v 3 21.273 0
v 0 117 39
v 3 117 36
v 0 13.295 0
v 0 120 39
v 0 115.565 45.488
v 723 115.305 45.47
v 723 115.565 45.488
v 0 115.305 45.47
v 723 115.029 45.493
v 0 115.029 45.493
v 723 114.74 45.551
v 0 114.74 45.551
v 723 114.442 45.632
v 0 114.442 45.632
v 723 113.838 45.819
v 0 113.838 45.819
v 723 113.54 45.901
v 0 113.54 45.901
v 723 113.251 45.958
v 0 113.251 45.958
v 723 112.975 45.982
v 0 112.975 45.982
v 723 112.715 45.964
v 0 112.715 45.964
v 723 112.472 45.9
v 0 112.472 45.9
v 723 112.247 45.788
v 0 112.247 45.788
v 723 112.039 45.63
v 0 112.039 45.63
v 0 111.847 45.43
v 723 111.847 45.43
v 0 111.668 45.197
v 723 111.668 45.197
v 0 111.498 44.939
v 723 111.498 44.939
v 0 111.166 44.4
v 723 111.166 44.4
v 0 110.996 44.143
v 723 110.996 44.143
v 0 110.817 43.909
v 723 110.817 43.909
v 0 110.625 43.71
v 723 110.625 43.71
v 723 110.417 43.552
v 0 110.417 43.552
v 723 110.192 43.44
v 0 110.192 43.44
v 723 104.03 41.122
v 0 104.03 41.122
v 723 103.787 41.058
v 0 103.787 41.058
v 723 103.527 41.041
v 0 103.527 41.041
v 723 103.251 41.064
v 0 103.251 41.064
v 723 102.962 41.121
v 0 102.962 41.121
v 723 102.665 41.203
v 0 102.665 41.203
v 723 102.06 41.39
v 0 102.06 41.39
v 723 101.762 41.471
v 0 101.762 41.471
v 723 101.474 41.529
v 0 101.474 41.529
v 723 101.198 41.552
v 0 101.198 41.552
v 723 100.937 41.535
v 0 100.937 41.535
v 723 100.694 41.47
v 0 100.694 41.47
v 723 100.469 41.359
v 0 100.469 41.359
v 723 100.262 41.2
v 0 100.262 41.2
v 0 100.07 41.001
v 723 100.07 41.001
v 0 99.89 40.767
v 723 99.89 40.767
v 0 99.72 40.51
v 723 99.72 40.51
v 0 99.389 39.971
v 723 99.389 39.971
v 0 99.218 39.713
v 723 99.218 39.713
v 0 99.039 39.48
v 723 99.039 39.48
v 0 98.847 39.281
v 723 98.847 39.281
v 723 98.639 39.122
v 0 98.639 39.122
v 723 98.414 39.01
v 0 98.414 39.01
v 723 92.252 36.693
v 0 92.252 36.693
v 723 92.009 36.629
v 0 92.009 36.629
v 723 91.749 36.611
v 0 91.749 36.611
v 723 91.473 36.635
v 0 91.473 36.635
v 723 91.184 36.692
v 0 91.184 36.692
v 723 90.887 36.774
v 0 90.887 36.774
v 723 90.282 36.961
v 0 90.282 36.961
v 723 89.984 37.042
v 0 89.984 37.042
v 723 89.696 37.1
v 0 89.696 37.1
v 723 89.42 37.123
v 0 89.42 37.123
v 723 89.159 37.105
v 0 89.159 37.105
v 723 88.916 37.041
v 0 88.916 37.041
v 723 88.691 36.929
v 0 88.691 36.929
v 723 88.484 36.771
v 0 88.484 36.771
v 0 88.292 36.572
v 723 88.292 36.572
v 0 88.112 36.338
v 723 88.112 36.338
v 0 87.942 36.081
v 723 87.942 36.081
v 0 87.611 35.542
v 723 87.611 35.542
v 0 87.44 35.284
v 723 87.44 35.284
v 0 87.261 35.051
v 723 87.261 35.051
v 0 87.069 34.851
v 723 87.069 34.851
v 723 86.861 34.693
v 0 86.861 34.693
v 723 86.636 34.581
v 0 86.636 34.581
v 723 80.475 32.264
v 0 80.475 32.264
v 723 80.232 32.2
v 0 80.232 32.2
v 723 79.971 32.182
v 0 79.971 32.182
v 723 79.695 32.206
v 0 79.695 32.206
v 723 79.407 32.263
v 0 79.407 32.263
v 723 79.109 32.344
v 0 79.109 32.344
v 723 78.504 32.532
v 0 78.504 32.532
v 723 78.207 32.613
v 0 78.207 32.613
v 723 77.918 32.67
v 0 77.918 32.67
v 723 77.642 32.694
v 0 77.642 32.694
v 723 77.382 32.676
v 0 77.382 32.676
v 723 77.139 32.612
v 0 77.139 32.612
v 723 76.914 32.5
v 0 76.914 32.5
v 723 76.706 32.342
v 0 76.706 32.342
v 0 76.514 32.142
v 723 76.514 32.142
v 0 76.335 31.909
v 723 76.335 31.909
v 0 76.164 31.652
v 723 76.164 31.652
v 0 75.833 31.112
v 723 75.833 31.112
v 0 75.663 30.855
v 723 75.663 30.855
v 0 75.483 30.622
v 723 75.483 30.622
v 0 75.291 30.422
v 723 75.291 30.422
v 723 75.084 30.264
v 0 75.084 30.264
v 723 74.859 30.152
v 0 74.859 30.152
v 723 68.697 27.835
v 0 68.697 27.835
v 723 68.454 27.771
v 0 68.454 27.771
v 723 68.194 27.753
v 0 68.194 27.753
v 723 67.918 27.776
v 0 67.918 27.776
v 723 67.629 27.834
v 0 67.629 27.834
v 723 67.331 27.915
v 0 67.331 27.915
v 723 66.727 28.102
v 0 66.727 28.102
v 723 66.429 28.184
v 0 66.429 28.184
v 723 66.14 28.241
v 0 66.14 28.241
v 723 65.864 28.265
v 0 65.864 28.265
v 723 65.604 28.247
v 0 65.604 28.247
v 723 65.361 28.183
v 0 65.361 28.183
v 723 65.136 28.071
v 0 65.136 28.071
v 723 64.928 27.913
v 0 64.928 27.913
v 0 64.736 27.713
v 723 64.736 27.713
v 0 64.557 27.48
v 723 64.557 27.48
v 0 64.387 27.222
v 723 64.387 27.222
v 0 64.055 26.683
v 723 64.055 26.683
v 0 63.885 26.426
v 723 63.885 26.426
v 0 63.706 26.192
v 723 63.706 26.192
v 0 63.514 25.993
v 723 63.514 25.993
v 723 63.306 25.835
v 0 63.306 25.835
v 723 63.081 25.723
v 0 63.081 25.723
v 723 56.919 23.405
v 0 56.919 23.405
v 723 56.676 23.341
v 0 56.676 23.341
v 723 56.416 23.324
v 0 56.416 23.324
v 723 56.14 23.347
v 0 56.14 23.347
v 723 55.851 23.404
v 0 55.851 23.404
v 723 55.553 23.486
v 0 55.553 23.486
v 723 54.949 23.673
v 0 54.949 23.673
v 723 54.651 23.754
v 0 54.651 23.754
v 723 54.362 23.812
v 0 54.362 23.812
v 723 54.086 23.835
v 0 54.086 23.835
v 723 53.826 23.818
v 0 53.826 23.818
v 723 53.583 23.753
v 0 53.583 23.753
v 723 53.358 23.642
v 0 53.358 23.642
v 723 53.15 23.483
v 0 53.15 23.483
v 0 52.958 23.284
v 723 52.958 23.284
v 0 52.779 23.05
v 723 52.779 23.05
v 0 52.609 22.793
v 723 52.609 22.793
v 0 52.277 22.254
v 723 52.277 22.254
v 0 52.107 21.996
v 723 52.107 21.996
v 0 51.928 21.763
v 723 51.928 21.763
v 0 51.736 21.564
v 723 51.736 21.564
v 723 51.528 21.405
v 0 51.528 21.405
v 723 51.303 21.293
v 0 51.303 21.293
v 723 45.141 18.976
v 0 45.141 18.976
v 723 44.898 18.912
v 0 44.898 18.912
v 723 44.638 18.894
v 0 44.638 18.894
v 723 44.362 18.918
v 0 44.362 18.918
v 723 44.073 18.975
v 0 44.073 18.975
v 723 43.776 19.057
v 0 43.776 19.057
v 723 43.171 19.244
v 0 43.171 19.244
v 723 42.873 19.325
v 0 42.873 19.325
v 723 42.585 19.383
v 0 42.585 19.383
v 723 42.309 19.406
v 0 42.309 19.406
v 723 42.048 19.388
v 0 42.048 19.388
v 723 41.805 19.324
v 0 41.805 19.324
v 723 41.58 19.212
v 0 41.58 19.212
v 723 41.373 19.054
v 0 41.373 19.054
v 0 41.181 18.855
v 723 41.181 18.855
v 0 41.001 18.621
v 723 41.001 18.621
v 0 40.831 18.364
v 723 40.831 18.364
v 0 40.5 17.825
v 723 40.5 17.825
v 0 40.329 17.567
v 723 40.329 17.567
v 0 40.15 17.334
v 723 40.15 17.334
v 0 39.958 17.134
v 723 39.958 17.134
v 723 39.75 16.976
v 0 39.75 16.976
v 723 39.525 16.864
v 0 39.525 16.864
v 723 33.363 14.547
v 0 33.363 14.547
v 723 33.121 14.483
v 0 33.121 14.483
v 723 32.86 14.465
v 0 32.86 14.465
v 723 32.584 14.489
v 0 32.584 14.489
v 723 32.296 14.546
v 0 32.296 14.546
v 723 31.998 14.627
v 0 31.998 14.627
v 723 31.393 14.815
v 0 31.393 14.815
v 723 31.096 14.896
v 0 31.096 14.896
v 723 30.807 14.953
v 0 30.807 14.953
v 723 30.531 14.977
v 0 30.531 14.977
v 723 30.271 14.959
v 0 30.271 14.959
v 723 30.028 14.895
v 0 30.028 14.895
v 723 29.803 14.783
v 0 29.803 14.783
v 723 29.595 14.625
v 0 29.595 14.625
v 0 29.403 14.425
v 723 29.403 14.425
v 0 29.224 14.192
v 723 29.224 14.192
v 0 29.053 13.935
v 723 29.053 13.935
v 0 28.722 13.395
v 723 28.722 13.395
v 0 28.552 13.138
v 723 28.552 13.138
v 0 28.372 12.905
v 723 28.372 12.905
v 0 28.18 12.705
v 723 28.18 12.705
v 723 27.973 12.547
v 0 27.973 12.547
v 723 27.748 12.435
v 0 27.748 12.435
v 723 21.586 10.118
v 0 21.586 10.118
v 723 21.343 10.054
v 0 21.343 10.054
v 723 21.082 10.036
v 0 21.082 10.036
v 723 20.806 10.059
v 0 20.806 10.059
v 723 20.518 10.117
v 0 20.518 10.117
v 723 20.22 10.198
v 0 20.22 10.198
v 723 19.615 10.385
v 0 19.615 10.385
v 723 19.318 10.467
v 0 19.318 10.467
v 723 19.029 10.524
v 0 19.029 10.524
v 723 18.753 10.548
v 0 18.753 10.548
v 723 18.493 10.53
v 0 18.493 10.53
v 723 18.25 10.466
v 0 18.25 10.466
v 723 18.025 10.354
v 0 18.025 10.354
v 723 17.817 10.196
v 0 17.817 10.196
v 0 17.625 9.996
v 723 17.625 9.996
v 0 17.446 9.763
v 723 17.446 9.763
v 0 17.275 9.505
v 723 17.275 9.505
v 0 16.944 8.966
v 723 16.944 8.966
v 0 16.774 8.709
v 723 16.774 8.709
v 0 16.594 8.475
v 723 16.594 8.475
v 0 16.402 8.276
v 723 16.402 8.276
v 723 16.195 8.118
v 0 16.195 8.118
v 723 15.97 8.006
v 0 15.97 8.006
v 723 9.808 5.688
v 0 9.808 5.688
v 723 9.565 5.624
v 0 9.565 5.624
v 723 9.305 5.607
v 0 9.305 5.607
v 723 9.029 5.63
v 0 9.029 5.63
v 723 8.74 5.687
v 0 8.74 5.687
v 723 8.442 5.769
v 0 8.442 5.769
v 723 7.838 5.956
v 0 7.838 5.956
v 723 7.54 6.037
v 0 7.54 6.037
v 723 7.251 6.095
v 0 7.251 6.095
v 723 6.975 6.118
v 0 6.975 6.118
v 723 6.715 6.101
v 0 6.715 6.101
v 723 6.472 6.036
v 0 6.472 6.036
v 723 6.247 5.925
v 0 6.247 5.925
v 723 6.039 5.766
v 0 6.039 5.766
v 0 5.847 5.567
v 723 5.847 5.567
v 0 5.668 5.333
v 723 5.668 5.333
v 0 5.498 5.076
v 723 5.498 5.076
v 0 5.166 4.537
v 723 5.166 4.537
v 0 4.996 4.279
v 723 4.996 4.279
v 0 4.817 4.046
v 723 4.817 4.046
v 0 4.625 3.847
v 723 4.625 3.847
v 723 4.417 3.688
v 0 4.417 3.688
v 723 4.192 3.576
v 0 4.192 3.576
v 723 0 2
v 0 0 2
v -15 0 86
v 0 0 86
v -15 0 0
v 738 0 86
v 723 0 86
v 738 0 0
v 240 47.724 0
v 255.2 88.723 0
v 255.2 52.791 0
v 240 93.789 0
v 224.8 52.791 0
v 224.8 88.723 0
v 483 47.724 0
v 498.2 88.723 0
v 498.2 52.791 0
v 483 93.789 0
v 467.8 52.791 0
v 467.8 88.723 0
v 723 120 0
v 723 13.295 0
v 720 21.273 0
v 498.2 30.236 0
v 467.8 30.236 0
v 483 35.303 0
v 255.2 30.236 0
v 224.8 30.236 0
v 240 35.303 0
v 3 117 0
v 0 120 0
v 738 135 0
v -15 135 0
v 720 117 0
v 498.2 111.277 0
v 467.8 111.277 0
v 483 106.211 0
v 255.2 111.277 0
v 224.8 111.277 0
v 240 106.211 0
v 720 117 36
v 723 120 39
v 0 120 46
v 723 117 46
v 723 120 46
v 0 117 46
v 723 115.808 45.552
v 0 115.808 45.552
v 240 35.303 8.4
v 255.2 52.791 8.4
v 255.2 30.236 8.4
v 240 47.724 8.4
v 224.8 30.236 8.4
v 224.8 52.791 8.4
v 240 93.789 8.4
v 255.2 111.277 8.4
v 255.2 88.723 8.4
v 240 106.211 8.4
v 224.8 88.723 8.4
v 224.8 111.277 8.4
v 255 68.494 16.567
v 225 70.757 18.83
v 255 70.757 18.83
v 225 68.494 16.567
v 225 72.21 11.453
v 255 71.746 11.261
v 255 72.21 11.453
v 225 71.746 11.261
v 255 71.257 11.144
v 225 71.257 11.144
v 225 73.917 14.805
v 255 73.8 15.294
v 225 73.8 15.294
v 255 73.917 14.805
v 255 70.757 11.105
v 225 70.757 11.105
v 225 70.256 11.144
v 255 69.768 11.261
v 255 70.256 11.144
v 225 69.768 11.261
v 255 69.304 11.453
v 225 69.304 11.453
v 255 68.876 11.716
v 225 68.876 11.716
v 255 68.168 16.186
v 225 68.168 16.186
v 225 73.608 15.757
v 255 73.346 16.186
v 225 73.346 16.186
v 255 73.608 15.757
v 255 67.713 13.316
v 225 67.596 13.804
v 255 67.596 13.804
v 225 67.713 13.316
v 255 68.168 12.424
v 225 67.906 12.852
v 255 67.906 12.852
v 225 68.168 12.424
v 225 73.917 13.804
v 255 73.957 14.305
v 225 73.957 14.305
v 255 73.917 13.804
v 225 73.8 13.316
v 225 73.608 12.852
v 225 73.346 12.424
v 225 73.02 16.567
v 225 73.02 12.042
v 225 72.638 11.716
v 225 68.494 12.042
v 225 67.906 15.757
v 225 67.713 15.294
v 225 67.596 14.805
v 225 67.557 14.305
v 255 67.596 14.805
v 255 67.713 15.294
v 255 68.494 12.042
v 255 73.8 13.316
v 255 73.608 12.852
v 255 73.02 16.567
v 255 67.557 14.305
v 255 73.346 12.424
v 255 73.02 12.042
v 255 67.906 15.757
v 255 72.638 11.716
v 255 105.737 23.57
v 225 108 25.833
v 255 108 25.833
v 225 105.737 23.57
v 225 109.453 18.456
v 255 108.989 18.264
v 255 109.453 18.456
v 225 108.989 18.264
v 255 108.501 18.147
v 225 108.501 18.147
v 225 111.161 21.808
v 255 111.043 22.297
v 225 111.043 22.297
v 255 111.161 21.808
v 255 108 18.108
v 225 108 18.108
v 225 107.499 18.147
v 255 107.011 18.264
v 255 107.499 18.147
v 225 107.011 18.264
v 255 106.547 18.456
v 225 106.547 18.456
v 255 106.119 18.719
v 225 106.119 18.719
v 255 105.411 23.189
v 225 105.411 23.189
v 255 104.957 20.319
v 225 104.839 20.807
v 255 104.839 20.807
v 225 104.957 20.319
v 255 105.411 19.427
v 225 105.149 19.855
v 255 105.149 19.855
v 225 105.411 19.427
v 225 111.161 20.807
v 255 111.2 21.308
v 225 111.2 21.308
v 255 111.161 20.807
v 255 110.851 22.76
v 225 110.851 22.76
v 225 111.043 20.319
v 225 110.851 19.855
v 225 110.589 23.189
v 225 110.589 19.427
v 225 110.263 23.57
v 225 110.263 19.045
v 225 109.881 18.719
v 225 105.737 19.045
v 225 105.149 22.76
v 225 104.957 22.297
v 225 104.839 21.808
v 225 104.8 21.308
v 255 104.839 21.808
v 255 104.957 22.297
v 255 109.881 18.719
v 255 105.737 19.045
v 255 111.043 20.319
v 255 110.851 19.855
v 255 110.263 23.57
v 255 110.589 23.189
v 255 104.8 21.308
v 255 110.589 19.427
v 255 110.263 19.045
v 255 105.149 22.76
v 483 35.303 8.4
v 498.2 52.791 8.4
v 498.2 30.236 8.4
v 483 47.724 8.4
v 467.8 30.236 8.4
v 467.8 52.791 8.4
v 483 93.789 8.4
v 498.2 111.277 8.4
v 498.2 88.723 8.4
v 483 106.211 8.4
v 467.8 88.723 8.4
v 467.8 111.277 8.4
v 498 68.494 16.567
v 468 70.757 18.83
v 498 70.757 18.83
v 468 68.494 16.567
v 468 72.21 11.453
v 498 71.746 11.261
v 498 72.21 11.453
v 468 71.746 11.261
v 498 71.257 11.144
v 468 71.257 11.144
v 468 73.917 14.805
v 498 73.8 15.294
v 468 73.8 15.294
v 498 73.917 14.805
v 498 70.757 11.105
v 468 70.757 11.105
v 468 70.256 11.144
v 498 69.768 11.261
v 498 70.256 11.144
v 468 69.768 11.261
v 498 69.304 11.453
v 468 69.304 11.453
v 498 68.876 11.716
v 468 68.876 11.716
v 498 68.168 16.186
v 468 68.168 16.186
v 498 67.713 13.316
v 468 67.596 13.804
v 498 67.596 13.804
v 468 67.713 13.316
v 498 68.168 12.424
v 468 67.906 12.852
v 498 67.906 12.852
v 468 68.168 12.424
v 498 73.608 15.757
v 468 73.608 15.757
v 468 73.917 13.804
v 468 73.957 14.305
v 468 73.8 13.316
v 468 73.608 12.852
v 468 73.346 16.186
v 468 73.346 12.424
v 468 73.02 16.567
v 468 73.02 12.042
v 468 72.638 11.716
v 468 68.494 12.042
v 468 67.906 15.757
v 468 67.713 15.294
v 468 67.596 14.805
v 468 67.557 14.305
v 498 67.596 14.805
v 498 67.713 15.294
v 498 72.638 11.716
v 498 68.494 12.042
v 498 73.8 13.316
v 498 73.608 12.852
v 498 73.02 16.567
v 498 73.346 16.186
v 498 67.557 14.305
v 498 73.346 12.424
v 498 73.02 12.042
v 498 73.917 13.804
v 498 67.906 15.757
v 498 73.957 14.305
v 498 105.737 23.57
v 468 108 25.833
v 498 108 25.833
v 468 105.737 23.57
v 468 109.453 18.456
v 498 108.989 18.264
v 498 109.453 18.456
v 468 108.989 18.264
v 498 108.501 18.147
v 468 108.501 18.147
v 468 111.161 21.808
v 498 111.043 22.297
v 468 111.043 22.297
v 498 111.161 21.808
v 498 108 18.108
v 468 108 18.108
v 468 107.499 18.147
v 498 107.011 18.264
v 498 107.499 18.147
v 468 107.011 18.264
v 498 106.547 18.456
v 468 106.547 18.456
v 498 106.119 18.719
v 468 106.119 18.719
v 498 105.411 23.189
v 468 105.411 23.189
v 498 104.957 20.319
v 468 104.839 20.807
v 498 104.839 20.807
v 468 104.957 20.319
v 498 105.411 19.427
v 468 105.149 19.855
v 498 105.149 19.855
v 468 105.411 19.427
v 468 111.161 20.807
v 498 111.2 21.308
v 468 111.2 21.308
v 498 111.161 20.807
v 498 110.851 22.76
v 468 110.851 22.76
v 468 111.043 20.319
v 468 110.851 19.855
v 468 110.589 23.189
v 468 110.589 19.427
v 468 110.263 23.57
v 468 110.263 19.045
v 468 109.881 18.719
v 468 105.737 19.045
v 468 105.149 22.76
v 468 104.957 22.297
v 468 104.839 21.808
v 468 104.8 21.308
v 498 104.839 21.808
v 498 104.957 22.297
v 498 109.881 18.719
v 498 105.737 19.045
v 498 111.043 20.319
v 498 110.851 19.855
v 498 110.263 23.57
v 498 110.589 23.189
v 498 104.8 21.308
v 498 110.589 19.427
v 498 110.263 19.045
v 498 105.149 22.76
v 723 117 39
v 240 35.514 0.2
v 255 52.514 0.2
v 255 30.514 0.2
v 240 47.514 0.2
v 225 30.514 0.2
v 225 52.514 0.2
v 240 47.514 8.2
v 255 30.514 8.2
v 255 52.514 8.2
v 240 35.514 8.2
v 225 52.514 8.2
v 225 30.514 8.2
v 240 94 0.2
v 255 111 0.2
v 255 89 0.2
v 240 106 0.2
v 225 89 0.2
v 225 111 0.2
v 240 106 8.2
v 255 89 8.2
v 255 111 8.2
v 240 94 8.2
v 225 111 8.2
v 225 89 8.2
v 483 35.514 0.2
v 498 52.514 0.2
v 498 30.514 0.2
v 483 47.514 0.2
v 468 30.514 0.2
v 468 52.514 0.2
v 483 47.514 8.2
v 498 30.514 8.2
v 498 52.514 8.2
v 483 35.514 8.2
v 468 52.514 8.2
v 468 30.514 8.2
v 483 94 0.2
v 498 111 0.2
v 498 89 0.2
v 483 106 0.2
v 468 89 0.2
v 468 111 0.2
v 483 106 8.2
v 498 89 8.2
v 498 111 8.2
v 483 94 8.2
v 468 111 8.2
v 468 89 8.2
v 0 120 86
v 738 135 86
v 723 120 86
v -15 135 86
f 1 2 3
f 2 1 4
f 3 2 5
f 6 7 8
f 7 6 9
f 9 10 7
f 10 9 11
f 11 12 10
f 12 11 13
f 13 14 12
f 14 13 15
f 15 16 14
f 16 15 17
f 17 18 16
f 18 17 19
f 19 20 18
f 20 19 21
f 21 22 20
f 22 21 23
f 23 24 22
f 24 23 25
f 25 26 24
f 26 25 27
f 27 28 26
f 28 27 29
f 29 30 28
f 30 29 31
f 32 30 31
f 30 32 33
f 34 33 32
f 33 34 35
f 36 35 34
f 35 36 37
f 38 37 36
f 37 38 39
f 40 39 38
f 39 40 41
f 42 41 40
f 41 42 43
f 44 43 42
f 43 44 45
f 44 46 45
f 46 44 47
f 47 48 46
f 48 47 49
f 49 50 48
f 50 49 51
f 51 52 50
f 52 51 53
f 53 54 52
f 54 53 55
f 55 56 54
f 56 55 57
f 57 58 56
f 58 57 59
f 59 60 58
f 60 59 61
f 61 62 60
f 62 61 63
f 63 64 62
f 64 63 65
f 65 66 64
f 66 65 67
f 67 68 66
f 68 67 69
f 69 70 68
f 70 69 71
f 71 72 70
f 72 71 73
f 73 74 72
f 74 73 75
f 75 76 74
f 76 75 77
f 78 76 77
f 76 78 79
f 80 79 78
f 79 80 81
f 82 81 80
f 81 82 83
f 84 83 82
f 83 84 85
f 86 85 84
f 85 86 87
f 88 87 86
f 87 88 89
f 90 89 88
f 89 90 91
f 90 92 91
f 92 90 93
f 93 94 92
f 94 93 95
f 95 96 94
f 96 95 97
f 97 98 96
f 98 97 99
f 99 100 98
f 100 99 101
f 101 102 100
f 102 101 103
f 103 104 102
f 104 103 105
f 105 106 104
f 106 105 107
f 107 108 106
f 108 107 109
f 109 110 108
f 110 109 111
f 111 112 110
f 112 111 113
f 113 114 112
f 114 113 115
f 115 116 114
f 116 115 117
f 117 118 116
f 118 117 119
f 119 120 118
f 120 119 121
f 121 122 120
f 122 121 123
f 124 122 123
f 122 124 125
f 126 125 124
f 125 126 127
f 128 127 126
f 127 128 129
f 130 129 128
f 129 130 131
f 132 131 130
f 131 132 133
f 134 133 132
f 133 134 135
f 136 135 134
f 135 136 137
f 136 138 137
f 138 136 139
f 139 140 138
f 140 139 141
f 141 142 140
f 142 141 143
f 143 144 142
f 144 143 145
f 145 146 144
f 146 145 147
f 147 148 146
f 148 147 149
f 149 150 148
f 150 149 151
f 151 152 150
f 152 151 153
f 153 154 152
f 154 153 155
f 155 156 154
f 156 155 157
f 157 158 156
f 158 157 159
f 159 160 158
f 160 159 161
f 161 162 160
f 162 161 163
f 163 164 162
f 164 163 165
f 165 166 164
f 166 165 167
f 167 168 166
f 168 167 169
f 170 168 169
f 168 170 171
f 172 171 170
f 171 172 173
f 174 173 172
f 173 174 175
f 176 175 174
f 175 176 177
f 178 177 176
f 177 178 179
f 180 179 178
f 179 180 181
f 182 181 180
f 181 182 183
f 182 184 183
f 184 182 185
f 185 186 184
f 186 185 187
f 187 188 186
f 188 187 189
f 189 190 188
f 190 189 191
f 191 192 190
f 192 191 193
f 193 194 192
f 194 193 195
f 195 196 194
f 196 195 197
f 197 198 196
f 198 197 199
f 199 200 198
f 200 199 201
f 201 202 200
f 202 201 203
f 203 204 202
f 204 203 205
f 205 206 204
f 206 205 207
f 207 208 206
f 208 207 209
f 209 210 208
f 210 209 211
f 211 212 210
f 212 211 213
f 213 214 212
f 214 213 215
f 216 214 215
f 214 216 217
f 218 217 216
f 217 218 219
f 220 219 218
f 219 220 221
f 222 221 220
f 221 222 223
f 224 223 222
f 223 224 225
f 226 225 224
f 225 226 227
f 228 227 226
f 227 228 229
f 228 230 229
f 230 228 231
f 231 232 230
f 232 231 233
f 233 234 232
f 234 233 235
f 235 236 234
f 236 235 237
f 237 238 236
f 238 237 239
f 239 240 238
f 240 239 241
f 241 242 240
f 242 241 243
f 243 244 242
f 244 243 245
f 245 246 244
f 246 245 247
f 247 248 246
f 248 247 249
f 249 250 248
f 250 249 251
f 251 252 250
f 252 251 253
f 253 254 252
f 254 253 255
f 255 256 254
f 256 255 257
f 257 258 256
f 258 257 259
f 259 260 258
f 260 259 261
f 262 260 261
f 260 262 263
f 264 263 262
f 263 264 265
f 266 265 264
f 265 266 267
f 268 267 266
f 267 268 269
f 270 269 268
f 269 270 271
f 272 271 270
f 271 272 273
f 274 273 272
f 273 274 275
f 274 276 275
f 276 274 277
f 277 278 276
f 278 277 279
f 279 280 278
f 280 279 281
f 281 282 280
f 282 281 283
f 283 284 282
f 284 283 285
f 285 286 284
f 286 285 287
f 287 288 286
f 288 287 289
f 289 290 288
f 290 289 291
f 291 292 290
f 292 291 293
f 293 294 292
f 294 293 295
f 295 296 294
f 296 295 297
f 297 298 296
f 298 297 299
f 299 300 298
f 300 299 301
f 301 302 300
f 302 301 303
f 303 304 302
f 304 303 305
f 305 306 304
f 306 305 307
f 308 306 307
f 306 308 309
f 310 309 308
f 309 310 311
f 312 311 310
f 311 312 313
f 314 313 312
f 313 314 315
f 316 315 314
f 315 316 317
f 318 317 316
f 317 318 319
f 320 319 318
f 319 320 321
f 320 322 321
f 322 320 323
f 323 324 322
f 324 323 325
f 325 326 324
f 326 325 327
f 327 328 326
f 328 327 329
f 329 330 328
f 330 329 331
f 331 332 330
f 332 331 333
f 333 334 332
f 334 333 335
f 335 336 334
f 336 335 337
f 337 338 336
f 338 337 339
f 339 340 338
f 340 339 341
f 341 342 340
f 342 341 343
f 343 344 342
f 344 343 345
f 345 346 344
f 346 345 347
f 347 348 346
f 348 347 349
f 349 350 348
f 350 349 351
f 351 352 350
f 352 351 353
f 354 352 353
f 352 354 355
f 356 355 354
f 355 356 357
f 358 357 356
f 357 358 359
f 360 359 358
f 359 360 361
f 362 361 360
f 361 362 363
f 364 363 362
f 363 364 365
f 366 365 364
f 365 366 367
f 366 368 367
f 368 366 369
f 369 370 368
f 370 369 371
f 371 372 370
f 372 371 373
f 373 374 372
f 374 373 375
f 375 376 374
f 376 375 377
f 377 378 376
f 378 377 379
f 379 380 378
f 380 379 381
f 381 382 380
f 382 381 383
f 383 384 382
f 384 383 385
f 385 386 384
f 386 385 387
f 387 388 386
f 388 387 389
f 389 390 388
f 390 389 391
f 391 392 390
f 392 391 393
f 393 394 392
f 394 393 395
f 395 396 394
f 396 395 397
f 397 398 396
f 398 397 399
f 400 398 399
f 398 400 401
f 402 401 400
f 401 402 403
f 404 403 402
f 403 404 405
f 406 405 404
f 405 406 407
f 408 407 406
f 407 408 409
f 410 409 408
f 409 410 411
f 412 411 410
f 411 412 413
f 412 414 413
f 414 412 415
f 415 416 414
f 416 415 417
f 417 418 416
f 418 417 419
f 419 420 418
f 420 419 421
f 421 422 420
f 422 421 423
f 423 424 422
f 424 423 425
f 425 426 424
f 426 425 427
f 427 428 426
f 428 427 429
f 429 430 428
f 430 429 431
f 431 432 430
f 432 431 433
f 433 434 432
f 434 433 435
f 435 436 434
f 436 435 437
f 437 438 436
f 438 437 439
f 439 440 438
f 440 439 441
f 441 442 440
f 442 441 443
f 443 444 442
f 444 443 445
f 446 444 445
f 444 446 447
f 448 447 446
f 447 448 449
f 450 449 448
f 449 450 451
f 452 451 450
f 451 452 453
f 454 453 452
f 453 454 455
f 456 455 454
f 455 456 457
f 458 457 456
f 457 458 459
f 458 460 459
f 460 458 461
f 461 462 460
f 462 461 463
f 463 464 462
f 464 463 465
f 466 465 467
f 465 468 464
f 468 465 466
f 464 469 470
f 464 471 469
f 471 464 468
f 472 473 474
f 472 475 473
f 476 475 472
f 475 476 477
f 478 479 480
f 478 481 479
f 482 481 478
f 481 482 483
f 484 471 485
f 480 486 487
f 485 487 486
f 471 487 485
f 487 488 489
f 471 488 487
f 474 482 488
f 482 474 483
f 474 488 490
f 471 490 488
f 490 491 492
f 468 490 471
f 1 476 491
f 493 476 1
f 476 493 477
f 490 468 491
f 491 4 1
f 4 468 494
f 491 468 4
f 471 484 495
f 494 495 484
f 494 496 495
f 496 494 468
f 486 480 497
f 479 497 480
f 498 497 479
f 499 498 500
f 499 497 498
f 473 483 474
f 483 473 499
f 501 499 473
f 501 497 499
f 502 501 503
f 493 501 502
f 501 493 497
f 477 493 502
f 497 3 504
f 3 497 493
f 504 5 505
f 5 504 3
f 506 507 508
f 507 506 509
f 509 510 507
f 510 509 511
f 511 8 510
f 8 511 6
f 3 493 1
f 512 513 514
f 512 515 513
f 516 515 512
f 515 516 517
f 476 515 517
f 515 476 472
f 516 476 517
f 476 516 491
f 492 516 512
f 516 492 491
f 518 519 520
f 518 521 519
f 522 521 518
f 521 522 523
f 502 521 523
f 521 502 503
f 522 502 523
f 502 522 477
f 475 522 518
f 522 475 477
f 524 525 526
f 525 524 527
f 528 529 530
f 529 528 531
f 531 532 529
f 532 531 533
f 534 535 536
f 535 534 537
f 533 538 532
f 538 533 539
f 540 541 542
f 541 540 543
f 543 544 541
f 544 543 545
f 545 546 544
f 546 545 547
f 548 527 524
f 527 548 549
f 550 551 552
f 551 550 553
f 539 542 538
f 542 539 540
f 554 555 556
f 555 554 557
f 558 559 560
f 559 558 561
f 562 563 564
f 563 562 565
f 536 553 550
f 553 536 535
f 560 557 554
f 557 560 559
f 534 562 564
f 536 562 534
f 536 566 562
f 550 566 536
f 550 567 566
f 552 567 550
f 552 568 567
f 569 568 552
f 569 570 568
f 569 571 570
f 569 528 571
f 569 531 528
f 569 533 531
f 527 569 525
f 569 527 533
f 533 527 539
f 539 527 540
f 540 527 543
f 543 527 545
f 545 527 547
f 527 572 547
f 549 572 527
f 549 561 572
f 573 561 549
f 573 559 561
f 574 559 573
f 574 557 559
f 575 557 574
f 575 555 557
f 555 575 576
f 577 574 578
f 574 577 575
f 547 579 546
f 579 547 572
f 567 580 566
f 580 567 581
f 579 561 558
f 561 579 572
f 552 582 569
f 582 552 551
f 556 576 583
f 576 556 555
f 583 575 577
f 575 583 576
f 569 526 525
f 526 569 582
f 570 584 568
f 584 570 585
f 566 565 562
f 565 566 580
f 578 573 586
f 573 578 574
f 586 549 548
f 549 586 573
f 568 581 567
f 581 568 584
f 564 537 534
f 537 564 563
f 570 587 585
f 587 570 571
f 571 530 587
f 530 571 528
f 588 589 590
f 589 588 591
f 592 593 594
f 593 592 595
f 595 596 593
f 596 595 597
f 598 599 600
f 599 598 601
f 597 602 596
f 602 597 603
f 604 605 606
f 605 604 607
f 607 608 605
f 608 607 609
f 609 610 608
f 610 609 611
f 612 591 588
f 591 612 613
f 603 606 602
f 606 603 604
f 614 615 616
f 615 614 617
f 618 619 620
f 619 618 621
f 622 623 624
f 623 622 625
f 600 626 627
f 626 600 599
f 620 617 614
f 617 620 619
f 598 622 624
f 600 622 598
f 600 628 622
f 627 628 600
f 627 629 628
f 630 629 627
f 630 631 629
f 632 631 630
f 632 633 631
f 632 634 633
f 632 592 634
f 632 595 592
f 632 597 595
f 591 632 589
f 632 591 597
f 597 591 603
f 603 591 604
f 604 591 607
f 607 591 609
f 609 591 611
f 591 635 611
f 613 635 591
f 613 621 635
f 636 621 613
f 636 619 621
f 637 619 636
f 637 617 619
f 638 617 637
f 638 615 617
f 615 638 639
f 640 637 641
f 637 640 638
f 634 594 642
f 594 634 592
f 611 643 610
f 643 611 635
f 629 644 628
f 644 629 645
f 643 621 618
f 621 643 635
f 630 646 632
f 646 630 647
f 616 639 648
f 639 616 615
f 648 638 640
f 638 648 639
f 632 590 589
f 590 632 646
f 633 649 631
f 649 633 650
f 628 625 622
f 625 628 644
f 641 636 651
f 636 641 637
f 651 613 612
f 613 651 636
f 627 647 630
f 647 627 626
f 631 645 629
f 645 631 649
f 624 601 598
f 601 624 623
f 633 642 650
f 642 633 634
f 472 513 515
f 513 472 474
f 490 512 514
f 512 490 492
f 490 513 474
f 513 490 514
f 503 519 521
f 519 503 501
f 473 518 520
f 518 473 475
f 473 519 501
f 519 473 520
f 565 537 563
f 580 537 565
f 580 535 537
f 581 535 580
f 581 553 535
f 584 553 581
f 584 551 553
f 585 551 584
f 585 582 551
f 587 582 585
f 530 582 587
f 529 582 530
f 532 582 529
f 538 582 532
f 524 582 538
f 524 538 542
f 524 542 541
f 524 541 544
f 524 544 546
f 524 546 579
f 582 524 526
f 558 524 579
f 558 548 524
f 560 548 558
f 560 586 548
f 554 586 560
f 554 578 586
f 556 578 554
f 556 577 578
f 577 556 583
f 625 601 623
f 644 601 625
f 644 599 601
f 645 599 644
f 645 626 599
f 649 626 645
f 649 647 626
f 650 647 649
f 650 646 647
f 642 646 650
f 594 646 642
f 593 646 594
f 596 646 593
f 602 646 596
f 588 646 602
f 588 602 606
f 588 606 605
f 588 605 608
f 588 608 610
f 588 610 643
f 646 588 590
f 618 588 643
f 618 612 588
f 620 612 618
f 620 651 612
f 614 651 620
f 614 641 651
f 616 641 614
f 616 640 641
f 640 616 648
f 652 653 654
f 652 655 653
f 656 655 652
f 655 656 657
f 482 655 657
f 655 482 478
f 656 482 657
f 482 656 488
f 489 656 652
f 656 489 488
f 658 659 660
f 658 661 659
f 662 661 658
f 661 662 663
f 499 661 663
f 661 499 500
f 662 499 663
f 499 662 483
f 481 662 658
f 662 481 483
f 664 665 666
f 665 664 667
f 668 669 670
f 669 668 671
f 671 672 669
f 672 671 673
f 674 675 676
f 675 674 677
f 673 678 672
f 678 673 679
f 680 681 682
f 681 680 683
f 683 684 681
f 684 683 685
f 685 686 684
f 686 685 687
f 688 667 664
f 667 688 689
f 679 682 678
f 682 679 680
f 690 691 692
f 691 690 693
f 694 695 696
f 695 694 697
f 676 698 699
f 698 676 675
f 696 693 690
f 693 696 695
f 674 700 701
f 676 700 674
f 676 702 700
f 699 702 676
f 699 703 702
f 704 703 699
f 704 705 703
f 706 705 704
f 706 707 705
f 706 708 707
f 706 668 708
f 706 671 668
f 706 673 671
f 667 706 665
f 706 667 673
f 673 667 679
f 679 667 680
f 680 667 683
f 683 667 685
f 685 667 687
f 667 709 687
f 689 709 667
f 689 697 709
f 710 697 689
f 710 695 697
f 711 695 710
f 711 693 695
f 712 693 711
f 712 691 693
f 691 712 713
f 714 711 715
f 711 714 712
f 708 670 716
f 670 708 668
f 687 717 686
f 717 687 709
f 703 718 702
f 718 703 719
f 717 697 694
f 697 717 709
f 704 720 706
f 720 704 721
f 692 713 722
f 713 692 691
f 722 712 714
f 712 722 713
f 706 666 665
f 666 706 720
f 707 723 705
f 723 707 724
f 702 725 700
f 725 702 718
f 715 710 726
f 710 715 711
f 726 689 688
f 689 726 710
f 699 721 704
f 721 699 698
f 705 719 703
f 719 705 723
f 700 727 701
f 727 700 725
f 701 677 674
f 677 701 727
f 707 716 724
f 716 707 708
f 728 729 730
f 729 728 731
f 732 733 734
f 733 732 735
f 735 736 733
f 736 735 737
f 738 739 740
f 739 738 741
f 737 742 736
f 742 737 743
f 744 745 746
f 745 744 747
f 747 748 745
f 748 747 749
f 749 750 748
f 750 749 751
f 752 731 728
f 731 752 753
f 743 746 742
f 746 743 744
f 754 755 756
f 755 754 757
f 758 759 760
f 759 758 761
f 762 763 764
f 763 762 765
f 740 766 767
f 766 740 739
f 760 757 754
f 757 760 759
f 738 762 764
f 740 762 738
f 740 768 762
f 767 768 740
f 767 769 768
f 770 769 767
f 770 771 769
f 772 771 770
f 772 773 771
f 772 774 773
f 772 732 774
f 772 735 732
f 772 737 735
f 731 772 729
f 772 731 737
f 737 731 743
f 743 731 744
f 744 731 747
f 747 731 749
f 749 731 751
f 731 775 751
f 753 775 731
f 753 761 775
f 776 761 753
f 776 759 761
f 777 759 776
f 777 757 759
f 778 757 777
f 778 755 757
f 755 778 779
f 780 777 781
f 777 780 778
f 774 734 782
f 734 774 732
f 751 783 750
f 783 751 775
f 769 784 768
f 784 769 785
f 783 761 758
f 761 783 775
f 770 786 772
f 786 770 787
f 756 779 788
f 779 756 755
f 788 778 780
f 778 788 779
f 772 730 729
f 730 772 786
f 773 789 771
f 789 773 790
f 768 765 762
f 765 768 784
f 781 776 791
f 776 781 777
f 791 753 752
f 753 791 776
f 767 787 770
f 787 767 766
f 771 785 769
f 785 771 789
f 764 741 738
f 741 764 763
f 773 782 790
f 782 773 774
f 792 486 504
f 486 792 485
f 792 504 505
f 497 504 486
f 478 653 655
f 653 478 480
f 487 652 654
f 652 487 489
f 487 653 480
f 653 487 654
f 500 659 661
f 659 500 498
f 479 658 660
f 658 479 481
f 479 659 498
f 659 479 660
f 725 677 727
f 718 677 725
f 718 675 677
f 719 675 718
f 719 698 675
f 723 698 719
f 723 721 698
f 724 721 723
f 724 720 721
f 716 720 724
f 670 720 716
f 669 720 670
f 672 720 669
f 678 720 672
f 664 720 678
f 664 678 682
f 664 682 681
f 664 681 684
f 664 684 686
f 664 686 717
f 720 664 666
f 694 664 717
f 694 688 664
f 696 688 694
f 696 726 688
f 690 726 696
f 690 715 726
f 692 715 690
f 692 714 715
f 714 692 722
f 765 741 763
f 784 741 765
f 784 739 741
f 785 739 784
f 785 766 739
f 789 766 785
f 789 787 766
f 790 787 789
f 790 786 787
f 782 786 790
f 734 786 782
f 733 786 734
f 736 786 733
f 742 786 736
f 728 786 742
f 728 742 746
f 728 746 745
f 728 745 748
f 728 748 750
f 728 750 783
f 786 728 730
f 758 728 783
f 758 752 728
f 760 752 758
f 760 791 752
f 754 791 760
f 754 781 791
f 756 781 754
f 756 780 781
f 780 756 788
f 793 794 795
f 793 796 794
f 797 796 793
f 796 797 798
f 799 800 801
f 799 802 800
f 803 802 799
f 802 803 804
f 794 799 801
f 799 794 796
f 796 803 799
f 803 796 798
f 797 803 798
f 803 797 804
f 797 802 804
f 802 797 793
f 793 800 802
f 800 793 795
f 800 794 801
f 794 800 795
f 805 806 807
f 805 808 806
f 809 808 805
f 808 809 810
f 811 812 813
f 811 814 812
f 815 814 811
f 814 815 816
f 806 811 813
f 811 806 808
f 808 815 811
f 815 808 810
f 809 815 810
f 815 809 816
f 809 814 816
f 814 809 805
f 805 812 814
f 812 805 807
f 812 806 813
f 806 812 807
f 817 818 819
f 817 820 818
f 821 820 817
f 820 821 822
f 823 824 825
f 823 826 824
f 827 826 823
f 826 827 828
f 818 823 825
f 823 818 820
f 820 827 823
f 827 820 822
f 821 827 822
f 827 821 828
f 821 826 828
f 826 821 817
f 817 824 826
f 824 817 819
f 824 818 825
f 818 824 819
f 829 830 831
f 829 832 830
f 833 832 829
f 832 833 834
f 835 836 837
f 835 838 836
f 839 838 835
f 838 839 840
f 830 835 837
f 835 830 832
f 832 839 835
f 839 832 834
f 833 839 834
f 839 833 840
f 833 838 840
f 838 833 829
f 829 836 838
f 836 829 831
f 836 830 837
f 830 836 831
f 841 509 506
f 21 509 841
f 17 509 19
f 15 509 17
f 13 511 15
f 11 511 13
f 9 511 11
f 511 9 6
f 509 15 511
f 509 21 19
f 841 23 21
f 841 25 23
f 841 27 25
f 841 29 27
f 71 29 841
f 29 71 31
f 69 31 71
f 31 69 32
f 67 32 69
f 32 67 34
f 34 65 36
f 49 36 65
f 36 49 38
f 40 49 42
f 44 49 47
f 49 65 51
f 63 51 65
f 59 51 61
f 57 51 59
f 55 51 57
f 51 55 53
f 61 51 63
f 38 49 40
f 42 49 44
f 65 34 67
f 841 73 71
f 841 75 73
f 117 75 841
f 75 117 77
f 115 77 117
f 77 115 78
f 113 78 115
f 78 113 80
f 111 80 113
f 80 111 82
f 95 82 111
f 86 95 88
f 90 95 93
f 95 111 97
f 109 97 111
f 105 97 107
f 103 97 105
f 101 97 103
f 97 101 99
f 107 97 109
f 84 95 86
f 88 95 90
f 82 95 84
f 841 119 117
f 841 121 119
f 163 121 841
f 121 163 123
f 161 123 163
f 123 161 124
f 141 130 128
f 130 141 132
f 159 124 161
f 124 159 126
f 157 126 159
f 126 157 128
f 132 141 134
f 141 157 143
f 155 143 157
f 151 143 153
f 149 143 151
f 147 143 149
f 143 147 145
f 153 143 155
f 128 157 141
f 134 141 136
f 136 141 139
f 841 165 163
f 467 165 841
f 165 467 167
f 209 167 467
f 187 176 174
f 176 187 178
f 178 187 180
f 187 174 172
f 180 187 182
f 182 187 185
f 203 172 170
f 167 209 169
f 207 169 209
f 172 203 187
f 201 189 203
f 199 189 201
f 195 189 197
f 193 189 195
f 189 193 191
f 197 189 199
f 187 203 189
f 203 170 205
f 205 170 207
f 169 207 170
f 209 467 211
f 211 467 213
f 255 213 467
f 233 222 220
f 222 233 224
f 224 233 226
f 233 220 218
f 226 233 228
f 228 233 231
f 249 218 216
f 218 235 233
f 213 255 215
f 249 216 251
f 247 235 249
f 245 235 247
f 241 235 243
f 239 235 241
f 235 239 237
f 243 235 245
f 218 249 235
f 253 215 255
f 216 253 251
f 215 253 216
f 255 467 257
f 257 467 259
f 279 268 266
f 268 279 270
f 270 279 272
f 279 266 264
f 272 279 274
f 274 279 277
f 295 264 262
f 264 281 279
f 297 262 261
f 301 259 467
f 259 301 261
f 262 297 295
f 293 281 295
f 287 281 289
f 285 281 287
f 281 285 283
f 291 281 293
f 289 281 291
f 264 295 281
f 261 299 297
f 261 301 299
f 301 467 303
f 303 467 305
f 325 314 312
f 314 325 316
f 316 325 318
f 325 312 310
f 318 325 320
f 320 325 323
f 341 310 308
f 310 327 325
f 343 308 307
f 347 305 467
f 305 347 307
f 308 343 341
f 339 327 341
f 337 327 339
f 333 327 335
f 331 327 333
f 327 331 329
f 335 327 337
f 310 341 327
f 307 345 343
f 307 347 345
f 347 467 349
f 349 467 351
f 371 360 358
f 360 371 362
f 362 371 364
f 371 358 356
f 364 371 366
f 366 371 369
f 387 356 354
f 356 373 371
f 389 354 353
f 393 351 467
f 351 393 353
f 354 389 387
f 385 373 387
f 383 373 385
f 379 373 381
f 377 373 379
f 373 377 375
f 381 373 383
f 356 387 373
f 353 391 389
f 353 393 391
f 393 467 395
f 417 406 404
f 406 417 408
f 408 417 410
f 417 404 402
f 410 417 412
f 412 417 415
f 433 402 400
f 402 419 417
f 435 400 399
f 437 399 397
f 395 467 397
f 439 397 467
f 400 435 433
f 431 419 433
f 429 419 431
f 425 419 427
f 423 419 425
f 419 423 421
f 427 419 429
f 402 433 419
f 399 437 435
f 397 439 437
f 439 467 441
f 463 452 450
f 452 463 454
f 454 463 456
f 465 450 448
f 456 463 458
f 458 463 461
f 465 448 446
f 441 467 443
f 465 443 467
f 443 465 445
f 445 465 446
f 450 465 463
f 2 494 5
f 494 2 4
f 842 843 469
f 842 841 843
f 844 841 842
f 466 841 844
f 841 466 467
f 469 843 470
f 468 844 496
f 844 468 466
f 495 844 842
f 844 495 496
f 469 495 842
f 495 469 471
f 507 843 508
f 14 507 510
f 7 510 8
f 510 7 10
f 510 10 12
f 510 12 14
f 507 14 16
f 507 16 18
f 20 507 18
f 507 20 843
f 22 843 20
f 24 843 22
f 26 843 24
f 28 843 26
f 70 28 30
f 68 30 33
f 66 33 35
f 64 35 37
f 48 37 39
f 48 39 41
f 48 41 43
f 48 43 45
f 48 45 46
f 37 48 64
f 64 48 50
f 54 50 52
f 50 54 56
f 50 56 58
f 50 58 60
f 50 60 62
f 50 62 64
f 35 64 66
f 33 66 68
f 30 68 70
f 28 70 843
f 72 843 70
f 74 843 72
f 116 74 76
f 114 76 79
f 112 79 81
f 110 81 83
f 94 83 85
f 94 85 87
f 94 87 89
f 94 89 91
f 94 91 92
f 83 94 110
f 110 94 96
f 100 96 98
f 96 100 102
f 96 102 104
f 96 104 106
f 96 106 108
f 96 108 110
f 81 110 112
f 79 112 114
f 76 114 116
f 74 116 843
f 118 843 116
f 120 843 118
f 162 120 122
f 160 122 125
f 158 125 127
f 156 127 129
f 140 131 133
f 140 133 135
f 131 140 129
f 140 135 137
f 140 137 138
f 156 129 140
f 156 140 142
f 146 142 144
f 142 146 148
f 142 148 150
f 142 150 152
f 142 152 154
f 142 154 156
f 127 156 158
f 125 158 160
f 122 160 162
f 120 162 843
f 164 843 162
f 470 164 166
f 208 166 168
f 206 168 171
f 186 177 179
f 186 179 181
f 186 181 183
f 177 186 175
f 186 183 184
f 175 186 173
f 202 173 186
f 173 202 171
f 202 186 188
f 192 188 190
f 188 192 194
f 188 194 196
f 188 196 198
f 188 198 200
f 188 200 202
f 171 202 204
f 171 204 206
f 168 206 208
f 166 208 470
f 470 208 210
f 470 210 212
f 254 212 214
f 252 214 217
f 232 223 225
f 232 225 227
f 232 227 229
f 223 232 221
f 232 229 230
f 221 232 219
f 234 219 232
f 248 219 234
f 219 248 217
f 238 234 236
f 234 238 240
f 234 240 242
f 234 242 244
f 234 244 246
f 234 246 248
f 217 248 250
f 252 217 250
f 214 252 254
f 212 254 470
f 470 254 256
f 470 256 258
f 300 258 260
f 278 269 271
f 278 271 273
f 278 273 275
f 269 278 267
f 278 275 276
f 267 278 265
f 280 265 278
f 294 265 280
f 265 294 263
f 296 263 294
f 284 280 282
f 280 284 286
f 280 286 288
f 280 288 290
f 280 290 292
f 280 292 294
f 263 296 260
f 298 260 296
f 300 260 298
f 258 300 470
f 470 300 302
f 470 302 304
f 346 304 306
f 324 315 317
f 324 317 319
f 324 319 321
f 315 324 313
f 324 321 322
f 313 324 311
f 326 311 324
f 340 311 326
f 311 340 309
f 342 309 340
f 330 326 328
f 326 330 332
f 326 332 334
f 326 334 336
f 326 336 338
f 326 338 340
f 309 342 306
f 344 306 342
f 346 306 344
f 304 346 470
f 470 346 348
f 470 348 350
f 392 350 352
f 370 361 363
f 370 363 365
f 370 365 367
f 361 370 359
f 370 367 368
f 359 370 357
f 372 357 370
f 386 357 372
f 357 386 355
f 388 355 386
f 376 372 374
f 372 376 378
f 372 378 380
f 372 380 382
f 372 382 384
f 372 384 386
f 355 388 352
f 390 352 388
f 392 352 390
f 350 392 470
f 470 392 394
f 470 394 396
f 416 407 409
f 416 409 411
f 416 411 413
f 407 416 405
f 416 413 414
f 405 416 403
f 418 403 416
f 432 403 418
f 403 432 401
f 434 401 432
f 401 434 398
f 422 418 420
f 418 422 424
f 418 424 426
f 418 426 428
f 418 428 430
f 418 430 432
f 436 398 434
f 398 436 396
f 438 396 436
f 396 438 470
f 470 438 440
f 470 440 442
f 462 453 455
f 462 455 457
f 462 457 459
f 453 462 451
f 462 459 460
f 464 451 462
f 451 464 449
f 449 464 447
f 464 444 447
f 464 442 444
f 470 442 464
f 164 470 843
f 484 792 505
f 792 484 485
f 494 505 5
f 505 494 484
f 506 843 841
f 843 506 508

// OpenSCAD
// Threshold slope / step ramp
// ---------------------------------------------------------------------------
// Footprint 723 x 120 mm, 46 mm tall at the back, sloping down across the
// 120 mm (short) direction to a thin toe at the open front edge.
//
// Three sides sit against walls: the left end, the right end and the back
// (high) edge. On each wall side the solid body is held back from the wall by
// `wall_clearance`, and a thin top lip overhangs past the nominal wall line by
// `scribe_allowance`. Trim / sand that lip to follow the uneven wall. The lip
// has a 45 degree chamfer underneath, so nothing needs support.
//
// 723 mm will not fit a printer bed, so the ramp is cut into `segments`
// pieces joined by glued bow-tie keys (underside) plus two alignment pins
// per joint that keep the walking surfaces flush.
//
// Coordinates: X = along the 723 mm length, Y = front (low) -> back wall,
// Z = up. Every part prints in the orientation it is exported in, flat base
// down, no supports.
// ---------------------------------------------------------------------------

/* [Size (mm)] */
// Wall-to-wall length. Use the SMALLEST measurement you took.
opening_length = 723;
// Open front edge to the back wall.
depth = 120;
// Height at the back wall (the step you are ramping up to).
height = 46;
// Thickness of the low front edge. Below ~1.5 mm it chips and curls.
toe = 2;

/* [Fit to uneven walls] */
fit_left = true;
fit_right = true;
fit_back = true;
// Body is held this far off each wall (room for bulges / bad plaster).
wall_clearance = 3;
// Lip sticks out this far PAST the nominal wall line. Trim it to the wall.
scribe_allowance = 3;
// Lip thickness at its outer edge (chamfered at 45 deg underneath).
lip_thickness = 4;

/* [Printing] */
// 3 -> ~243 mm parts (250 mm+ beds), 4 -> ~183 mm parts (220 mm beds).
segments = 3;
// What to output.
part = "assembly"; // [assembly, segment, key, pin, hardware_plate, end_section]
// Which segment when part = "segment" (0 = left end).
segment_index = 0;

/* [Joints] */
key_length = 30;   // across the joint
key_width = 22;    // wide ends of the bow-tie
key_neck = 12;     // narrow middle (sits on the joint line)
key_height = 8;
key_fit = 0.2;     // clearance per side in the pocket
pin_d = 6;         // printed pin, or a 6 mm dowel / M6 rod
pin_fit = 0.4;     // extra hole diameter
pin_depth = 15;    // hole depth into each segment

/* [Preview] */
show_walls = true;   // ghost walls in the assembly view
explode = 0;         // gap between segments in the assembly view

/* [Grip] */
// Raised ribs with a smooth raised-cosine profile: no slots or sharp inside
// corners to trap dirt, so a cloth or mop wipes straight over them.
ribs = true;
rib_pitch = 12;    // centre to centre, measured along the slope
rib_width = 6;     // base width; the rib blends tangentially into the slope
rib_height = 1.5;

/* [Hidden] */
$fn = 40;
eps = 0.01;

lip_out = wall_clearance + scribe_allowance;       // lip reach beyond body face
chamfer_band = lip_thickness + lip_out;            // lip depth where it meets the body
y_body = depth - (fit_back ? wall_clearance : 0);  // body back face = top of slope
y_max = fit_back ? depth + scribe_allowance : y_body;
x_body0 = fit_left ? wall_clearance : 0;
x_body1 = opening_length - (fit_right ? wall_clearance : 0);
x_min = fit_left ? -scribe_allowance : 0;
x_max = opening_length + (fit_right ? scribe_allowance : 0);
k = (height - toe) / y_body;                       // rise per mm of run
slope_angle = atan(k);

function top(y) = min(toe + k * y, height);
function joint_x(i) = x_min + i * (x_max - x_min) / segments;

// Keys must leave >= 5 mm of plastic above the pocket at their front edge.
key_y_min = (key_height + 0.4 + 5 - toe) / k + key_width / 2 + key_fit;
key_y_max = y_body - key_width / 2 - 6;
key_ys = [key_y_min, key_y_max];
pin_ys = [(key_y_min + key_y_max) / 2, y_body - pin_d / 2 - 6];
pin_yz = [for (y = pin_ys) [y, top(y) / 2]];

// First rib clear of the front edge; last rib's crest no higher than the top
// of the slope, so nothing sticks up at the step.
rib_y0 = rib_width / 2 + 4;
rib_y1 = min((height - rib_height - toe) / k, y_body - rib_width / 2 - 1);
rib_n = max(1, round((rib_y1 - rib_y0) / (rib_pitch * cos(slope_angle))) + 1);
rib_ys = [for (i = [0 : rib_n - 1]) rib_n == 1 ? rib_y0 : rib_y0 + i * (rib_y1 - rib_y0) / (rib_n - 1)];

assert(key_y_min < key_y_max - key_width, "Ramp too low/short for two keys: reduce key_height or key_width");
assert(lip_thickness < height, "lip_thickness too large");
// Steeper ribs would undercut on the downhill side (dirt trap, needs support).
assert(atan(rib_height * PI / rib_width) + slope_angle < 75, "Ribs too steep: lower rib_height or widen rib_width");

// ---- building blocks ------------------------------------------------------

// Map a 2D (y, z) profile to a prism running along X from x0 to x1.
module along_x(x0, x1)
  multmatrix([[0, 0, 1, 0], [1, 0, 0, 0], [0, 1, 0, 0], [0, 0, 0, 1]])
    translate([0, 0, x0]) linear_extrude(x1 - x0) children();

// Bounded half-space z >= a*x + b*y + c.
module above_plane(a, b, c, size = 3000)
  multmatrix([[1, 0, 0, 0], [0, 1, 0, 0], [a, b, 1, c], [0, 0, 0, 1]])
    translate([-size / 2, -size / 2, 0]) cube(size);

// One rib in slope-local coordinates (u along the slope, v normal to it).
// The base dips 1 mm into the body so the union is clean.
module rib_2d() {
  n = 24;
  polygon(concat(
    [for (i = [0 : n]) let(u = -rib_width / 2 + i * rib_width / n)
      [u, rib_height / 2 * (1 + cos(360 * u / rib_width))]],
    [[rib_width / 2, -1], [-rib_width / 2, -1]]));
}

// Cross-section of the ramp in the Y-Z plane, including the back scribe lip.
module profile() {
  polygon([[0, 0], [y_body, 0], [y_body, height], [0, toe]]);
  if (fit_back)
    polygon([[y_body, height - chamfer_band], [y_max, height - lip_thickness],
             [y_max, height], [y_body, height]]);
  if (ribs)
    for (y = rib_ys) translate([y, top(y)]) rotate(slope_angle) rib_2d();
}

// Scribe lip on an end wall: same top surface as the ramp, underside rising at
// 45 deg from the body face out to the lip edge. Because the top is "slope,
// then flat", the region under it is the union of two half-spaces.
module end_lip(left) {
  dir = left ? -1 : 1;
  face = left ? x_body0 : -x_body1;
  intersection() {
    if (left) along_x(x_min, x_body0 + eps) profile();
    else along_x(x_body1 - eps, x_max) profile();
    union() {
      above_plane(dir, k, toe - chamfer_band + face);
      above_plane(dir, 0, height - chamfer_band + face);
    }
  }
}

module envelope() {
  along_x(x_body0, x_body1) profile();
  if (fit_left) end_lip(true);
  if (fit_right) end_lip(false);
}

module bowtie()
  polygon([[-key_length / 2, -key_width / 2], [0, -key_neck / 2],
           [key_length / 2, -key_width / 2], [key_length / 2, key_width / 2],
           [0, key_neck / 2], [-key_length / 2, key_width / 2]]);

// Circle with a 45 deg point on top so a horizontal hole prints without support.
module teardrop(r)
  union() {
    circle(r);
    polygon([[-r * cos(45), r * sin(45)], [r * cos(45), r * sin(45)], [0, r * sqrt(2)]]);
  }

module joint_cuts(xj) {
  for (yk = key_ys)
    translate([xj, yk, -1]) linear_extrude(key_height + 0.4 + 1) offset(delta = key_fit) bowtie();
  for (p = pin_yz)
    along_x(xj - pin_depth, xj + pin_depth) translate(p) teardrop((pin_d + pin_fit) / 2);
}

module segment(i) {
  xa = i == 0 ? x_min - 1 : joint_x(i);
  xb = i == segments - 1 ? x_max + 1 : joint_x(i + 1);
  difference() {
    intersection() {
      envelope();
      translate([xa, -1, -1]) cube([xb - xa, y_max + 2, height + 2]);
    }
    for (j = [i, i + 1]) if (j > 0 && j < segments) joint_cuts(joint_x(j));
  }
}

module key() linear_extrude(key_height) bowtie();

// Lies along X with a flat underneath so it prints on its side (layers run
// along the pin, the strong way for shear at the joint). The flat is deep
// enough that no part of the round underside overhangs more than 45 deg.
module pin() {
  len = 2 * pin_depth - 1;
  c = 0.6;  // end chamfer
  flat = pin_d / 2 * (1 - cos(45)) + 0.05;
  intersection() {
    translate([0, 0, pin_d / 2 - flat]) rotate([0, 90, 0]) union() {
      cylinder(d1 = pin_d - 2 * c, d2 = pin_d, h = c);
      translate([0, 0, c]) cylinder(d = pin_d, h = len - 2 * c);
      translate([0, 0, len - c]) cylinder(d1 = pin_d, d2 = pin_d - 2 * c, h = c);
    }
    translate([-1, -pin_d, 0]) cube([len + 2, 2 * pin_d, pin_d]);
  }
}

module hardware_plate() {
  n = segments - 1;  // joints
  for (j = [0 : n - 1], kk = [0 : 1])
    translate([(j * 2 + kk) * (key_length + 6), 0, 0]) key();
  for (j = [0 : n - 1], kk = [0 : 1])
    translate([(j * 2 + kk) * (2 * pin_depth + 5) - key_length / 2, key_width / 2 + 8, 0]) pin();
}

module walls_ghost() {
  t = 15;
  h = height + 40;
  color([0.6, 0.6, 0.6, 0.25]) {
    if (fit_left) translate([-t, 0, 0]) cube([t, depth + t, h]);
    if (fit_right) translate([opening_length, 0, 0]) cube([t, depth + t, h]);
    if (fit_back) translate([-t, depth, 0]) cube([opening_length + 2 * t, t, h]);
  }
}

// Left end piece sliced through the middle of the slope, next to its wall, to
// show the side scribe lip reaching past the wall line.
module end_section() {
  yc = depth / 2;
  intersection() {
    segment(0);
    translate([x_min - 1, yc, -1]) cube([60, depth, height + 2]);
  }
  color([0.6, 0.6, 0.6, 0.35]) translate([-15, yc, 0]) cube([15, depth / 2, height + 25]);
}

module assembly() {
  palette = [[0.90, 0.45, 0.15], [0.20, 0.55, 0.80], [0.35, 0.70, 0.35], [0.80, 0.70, 0.20], [0.6, 0.4, 0.8]];
  for (i = [0 : segments - 1])
    color(palette[i % len(palette)]) translate([i * explode, 0, 0]) segment(i);
  for (j = [1 : segments - 1], yk = key_ys)
    color("black") translate([joint_x(j) + (j - 0.5) * explode, yk, 0.2 - explode]) key();
  if (show_walls && explode == 0) walls_ghost();
}

// ---- output ---------------------------------------------------------------

if (part == "assembly") assembly();
else if (part == "segment")
  translate([-(segment_index == 0 ? x_min : joint_x(segment_index)), 0, 0]) segment(segment_index);
else if (part == "key") key();
else if (part == "pin") pin();
else if (part == "hardware_plate") hardware_plate();
else if (part == "end_section") end_section();
